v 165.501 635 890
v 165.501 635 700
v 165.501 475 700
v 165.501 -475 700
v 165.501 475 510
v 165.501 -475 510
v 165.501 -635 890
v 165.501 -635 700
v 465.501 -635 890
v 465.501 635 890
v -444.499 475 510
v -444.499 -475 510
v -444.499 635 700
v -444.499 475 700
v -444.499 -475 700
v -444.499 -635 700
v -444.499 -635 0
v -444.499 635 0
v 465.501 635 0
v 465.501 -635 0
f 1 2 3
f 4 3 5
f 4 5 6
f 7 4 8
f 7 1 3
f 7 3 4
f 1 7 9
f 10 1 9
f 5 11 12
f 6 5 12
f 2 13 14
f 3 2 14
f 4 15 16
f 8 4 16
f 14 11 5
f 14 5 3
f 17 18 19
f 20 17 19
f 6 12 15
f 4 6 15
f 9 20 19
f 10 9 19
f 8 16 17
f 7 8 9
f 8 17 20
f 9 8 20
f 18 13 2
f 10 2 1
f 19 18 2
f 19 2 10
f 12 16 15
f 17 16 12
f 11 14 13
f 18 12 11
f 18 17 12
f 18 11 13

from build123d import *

# Parameters (mm, degrees)
F0_W     = 910
F0_H     = 1270
F1_DEPTH = 890
F2_W     = 950
F2_H     = 380
F3_DEPTH = 610
F4_W     = 160
F4_H     = 190
F5_DEPTH = 610


with BuildPart() as f1:
    # F0 (on Top) → F1 (new body)
    with BuildSketch(Plane.XY):
        with Locations((10.50148, 0)):
            Rectangle(F0_W, F0_H)
    extrude(amount=F1_DEPTH)

    # F2 (on face) → F3 (cut)
    with BuildSketch(Plane(origin=(-444.49852, 0, 0), x_dir=(0, -1, 0), z_dir=(-1, 0, 0))):
        with Locations((0, 700)):
            Rectangle(F2_W, F2_H)
    extrude(amount=-F3_DEPTH, mode=Mode.SUBTRACT)

    # F4 (on face) → F5 (cut, through all)
    with BuildSketch(Plane(origin=(-444.49852, 0, 0), x_dir=(0, -1, 0), z_dir=(-1, 0, 0))):
        with Locations((-555, 795)):
            Rectangle(F4_W, F4_H)
        with Locations((555, 795)):
            Rectangle(F4_W, F4_H)
    extrude(amount=-F5_DEPTH, mode=Mode.SUBTRACT)


solid = f1.part
